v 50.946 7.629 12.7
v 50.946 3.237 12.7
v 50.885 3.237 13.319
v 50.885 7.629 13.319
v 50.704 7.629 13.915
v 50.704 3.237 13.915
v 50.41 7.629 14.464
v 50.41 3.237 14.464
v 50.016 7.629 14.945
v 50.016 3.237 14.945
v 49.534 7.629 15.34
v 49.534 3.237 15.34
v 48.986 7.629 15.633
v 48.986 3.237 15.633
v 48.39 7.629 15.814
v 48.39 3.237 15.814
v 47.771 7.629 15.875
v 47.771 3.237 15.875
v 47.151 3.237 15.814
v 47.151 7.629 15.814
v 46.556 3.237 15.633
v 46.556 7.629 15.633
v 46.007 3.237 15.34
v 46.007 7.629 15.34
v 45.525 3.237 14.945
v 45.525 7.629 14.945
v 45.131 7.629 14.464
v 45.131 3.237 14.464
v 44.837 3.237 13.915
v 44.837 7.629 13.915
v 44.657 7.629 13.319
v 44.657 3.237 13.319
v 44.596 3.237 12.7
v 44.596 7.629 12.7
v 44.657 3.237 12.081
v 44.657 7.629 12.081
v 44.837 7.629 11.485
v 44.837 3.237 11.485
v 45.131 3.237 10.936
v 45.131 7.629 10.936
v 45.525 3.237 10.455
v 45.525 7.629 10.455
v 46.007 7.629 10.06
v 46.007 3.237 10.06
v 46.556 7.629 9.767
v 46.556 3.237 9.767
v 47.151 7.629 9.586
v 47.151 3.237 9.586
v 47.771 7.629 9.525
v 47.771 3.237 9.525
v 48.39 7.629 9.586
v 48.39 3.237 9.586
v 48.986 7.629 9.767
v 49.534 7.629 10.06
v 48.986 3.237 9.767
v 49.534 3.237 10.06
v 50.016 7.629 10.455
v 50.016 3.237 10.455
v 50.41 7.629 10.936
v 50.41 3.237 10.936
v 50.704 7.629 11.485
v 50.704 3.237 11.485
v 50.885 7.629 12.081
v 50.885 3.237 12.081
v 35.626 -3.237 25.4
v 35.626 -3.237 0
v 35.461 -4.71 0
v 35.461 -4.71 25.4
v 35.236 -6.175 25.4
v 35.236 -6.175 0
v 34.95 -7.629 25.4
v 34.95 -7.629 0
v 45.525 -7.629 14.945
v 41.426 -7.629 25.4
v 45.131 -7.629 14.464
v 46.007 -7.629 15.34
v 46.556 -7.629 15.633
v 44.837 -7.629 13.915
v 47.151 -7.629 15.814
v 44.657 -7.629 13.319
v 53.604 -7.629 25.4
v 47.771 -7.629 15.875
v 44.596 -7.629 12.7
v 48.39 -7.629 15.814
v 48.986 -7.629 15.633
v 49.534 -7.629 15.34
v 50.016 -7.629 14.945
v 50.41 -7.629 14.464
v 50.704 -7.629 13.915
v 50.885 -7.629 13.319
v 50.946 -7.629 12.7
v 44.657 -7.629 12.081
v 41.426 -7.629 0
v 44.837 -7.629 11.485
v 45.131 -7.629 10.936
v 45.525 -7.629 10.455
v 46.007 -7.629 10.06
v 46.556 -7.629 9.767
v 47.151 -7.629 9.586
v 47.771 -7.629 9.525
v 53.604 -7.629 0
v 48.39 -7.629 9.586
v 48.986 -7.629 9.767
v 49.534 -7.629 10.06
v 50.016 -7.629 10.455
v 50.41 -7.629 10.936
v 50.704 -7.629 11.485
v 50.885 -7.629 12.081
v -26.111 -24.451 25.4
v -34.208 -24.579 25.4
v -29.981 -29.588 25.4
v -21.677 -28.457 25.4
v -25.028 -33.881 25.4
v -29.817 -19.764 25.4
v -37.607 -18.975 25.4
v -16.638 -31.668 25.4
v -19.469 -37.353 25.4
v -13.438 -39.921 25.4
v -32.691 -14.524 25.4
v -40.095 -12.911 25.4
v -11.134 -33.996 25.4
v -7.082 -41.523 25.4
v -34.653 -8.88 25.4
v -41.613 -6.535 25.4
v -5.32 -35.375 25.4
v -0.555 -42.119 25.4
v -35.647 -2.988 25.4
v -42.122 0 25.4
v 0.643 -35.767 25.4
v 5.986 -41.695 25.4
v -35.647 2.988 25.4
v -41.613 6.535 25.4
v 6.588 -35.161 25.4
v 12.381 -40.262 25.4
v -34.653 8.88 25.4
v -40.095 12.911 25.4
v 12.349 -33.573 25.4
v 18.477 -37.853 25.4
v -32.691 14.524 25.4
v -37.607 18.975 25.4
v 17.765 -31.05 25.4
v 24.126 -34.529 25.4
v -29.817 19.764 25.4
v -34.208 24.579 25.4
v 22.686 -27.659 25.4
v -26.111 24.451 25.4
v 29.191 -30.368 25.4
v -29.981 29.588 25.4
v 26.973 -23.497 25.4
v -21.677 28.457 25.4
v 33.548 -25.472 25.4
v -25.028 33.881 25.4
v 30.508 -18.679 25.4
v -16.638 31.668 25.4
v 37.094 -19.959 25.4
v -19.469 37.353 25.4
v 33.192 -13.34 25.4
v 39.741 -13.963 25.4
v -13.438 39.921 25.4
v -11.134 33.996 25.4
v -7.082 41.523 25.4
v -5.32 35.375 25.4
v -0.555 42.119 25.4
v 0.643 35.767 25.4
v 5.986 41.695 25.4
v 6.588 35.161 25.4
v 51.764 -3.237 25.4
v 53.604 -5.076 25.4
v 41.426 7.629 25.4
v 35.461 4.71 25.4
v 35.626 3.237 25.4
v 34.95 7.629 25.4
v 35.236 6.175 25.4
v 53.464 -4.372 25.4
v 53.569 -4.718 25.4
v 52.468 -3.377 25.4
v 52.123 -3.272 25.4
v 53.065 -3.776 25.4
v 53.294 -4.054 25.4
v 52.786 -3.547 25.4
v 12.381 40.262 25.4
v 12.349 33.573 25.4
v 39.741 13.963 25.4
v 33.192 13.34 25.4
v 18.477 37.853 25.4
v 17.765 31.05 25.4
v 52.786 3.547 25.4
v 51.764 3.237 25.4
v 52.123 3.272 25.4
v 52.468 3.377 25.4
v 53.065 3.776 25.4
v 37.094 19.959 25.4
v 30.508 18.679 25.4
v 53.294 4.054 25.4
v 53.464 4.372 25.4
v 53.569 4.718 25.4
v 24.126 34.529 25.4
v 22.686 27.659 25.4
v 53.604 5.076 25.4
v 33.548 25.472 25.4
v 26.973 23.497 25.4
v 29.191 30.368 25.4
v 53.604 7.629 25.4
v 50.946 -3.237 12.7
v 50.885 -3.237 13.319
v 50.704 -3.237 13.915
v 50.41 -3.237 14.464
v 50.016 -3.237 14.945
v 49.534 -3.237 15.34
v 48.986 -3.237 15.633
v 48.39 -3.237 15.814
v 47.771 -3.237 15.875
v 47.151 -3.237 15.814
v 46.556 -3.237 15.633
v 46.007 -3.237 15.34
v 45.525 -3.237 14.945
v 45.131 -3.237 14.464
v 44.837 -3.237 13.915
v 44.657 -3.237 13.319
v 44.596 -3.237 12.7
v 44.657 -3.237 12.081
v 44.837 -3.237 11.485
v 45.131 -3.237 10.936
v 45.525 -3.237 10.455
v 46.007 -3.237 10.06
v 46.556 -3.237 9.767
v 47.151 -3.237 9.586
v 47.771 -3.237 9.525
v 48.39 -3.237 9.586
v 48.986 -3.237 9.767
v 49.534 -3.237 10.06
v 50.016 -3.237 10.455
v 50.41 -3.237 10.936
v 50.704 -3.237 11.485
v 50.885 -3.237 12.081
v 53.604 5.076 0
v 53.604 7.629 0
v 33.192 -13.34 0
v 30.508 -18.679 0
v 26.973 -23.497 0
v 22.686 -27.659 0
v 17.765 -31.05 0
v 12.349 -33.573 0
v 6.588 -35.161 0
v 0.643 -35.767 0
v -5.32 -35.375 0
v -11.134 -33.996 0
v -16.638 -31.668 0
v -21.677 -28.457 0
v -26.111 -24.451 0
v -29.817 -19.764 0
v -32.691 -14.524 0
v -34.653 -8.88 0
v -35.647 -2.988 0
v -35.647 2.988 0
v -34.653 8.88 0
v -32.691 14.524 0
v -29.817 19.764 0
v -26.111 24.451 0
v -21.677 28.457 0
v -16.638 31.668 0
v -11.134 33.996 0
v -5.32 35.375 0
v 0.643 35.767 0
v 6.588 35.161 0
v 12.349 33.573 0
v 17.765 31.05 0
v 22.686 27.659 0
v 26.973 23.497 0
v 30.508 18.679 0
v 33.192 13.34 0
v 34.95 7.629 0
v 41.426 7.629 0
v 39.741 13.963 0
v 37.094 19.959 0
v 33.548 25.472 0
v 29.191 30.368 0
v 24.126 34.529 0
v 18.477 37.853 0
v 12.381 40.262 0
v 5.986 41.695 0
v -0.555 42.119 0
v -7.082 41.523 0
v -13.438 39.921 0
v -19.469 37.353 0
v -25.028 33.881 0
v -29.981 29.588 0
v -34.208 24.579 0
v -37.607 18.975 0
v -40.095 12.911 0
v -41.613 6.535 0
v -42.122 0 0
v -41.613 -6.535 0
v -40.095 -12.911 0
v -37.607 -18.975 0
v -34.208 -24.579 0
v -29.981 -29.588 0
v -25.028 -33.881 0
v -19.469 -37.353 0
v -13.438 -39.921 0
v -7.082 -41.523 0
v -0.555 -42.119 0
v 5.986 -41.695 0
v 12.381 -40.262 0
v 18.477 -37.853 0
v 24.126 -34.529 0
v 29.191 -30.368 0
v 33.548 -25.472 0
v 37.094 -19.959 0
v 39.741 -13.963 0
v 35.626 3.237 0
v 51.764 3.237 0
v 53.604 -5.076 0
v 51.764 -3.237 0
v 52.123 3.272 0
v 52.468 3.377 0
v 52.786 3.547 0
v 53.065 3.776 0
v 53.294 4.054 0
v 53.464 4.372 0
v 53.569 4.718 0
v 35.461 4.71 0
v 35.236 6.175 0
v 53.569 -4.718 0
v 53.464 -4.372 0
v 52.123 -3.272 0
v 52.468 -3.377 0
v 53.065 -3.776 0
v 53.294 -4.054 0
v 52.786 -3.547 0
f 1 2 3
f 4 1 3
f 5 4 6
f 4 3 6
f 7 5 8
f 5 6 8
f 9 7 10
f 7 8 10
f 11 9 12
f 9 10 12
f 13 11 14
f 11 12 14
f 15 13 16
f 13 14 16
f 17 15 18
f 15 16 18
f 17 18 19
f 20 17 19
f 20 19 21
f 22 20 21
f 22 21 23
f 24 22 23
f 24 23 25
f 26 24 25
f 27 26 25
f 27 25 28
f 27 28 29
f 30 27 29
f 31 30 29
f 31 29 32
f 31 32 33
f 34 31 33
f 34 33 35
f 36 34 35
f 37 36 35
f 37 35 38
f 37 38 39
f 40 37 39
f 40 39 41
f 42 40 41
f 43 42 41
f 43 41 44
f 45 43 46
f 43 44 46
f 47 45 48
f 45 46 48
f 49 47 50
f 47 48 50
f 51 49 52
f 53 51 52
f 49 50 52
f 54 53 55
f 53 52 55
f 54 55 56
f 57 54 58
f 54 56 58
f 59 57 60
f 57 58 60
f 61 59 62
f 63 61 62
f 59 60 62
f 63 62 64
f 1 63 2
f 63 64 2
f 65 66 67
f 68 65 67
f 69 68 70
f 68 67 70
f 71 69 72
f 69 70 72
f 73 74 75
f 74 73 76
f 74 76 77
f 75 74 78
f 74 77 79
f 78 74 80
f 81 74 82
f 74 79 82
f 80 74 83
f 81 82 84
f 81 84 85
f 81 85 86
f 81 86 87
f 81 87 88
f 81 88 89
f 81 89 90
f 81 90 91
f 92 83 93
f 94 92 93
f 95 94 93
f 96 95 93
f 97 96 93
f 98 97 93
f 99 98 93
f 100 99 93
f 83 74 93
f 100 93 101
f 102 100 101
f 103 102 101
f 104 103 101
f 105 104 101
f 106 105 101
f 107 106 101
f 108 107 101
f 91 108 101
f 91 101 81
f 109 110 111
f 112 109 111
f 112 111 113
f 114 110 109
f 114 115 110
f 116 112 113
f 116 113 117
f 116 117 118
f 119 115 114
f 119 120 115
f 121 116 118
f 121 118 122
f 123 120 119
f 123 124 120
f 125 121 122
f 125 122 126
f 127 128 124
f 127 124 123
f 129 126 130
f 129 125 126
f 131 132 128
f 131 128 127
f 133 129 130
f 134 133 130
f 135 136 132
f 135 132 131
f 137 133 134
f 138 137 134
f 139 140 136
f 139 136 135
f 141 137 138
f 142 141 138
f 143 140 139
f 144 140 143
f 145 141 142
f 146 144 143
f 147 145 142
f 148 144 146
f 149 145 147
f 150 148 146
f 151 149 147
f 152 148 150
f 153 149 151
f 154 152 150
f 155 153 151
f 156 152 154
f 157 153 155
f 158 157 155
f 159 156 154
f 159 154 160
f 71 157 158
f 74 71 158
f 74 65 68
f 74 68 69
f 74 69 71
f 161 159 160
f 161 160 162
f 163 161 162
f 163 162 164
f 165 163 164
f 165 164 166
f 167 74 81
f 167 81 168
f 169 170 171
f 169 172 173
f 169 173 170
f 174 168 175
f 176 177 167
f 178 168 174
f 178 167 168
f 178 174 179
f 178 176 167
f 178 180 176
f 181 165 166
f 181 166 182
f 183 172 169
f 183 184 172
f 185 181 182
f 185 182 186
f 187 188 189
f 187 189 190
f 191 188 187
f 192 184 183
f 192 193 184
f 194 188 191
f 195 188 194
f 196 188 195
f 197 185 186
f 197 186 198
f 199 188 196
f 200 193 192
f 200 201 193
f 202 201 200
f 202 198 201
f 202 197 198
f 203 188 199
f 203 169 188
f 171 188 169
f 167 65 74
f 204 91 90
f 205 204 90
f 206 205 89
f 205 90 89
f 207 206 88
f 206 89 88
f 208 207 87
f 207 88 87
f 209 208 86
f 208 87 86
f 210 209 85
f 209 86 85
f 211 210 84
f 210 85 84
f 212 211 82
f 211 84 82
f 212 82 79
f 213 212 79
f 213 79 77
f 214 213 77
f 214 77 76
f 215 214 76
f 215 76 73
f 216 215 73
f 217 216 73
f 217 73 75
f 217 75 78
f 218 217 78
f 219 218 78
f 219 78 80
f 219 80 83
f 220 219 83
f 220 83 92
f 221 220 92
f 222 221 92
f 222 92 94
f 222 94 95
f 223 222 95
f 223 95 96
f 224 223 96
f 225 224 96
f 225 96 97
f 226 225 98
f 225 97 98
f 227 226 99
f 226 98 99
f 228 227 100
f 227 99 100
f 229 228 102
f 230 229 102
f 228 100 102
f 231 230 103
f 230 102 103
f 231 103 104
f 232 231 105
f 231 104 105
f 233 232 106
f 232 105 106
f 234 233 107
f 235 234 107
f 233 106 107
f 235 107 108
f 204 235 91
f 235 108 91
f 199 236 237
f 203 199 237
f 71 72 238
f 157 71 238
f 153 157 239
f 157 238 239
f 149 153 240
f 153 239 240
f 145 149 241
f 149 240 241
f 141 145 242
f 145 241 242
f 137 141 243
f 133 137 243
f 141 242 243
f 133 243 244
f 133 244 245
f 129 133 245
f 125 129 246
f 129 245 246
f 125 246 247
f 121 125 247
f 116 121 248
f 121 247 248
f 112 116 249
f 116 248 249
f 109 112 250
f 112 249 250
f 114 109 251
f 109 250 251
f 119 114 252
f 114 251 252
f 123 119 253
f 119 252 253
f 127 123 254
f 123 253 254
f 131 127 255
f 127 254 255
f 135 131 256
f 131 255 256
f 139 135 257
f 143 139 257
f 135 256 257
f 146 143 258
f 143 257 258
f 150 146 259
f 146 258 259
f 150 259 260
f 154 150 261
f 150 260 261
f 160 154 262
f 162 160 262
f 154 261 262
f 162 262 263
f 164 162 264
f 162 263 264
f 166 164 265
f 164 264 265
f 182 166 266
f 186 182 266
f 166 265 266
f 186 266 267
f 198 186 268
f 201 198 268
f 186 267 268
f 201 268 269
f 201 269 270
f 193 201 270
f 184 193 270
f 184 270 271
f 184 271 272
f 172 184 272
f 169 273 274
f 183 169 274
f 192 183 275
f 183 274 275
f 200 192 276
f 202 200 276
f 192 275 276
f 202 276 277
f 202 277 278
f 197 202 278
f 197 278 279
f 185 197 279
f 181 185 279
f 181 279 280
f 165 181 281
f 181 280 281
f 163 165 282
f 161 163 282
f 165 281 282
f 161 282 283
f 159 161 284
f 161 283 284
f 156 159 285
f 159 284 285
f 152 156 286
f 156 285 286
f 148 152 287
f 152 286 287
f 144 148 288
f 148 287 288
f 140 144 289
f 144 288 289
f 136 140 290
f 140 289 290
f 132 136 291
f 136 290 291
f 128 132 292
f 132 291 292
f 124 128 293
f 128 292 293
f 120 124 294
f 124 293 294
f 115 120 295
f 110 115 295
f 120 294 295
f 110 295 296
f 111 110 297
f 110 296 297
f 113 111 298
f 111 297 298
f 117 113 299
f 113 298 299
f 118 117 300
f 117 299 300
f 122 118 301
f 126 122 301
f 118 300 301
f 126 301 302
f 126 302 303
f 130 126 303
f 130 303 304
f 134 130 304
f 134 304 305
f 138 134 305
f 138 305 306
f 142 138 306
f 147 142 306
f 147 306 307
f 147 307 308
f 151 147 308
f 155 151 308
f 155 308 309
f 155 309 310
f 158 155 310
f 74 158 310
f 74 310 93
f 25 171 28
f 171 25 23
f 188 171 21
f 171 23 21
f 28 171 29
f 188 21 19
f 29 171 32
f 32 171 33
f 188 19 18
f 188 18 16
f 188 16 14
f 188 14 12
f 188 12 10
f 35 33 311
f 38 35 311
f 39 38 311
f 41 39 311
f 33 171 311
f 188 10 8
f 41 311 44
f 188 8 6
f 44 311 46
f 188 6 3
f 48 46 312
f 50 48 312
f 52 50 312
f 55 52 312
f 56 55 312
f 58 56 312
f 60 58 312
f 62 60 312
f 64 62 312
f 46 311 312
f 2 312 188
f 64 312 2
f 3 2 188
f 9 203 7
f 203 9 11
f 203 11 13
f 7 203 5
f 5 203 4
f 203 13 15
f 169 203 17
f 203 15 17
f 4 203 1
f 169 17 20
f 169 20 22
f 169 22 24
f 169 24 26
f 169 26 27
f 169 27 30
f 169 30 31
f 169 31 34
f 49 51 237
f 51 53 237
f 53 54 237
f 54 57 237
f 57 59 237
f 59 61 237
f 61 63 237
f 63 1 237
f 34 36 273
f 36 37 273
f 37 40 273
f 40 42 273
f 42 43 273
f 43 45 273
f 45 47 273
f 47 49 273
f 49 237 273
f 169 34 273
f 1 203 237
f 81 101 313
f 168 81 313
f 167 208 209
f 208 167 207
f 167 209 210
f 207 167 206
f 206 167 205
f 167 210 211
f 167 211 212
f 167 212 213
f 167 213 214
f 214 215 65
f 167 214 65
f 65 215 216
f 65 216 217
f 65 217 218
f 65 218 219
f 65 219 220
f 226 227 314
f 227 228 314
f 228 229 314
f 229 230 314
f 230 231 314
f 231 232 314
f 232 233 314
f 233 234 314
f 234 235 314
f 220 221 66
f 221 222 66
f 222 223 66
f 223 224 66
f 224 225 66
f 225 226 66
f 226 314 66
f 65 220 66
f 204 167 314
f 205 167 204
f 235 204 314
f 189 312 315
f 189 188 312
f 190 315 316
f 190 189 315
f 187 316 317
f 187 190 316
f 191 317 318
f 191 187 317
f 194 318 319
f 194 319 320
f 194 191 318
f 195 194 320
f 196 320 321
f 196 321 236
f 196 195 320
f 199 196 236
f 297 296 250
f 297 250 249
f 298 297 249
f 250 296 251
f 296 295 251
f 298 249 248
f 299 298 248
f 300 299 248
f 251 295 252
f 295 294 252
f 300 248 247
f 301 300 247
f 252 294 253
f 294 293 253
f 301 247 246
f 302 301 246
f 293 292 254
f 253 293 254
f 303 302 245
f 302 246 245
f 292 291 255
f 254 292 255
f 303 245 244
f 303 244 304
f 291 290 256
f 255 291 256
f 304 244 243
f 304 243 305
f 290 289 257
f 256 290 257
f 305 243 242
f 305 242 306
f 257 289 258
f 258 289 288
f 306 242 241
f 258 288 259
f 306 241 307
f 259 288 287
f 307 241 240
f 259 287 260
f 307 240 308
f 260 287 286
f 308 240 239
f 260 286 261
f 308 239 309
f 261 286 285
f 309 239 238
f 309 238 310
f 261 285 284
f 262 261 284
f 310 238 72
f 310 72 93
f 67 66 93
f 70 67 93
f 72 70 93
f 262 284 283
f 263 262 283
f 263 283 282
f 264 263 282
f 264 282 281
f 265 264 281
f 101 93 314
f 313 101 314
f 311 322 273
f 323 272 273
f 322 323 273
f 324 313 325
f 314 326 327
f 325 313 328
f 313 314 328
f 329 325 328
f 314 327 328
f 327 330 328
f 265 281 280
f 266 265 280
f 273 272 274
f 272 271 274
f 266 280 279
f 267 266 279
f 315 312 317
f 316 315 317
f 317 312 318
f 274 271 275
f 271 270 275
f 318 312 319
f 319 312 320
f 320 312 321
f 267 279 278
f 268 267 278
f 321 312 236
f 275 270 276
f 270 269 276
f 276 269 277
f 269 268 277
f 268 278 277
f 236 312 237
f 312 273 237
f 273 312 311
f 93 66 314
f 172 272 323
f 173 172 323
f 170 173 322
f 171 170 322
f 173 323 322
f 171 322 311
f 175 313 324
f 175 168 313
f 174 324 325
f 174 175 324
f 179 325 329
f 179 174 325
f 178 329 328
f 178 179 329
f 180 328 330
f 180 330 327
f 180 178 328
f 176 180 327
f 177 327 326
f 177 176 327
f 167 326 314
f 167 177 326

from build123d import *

# Parameters (mm, degrees)
F1_DEPTH = 25.4
F3_D     = 6.35
F4_R     = 1.839631


with BuildPart() as f1:
    # F0 (on Top) → F1 (new body)
    with BuildSketch(Plane.XY):
        with BuildLine():
            ThreePointArc((34.949522, 7.62886), (35.355888, 5.443324), (35.62572, 3.236768))
            Line((35.62572, 3.236768), (41.997912, 3.236768))
            ThreePointArc((41.997912, 3.236768), (41.769655, 5.440338), (41.425859, 7.62886))
            Line((41.425859, 7.62886), (34.949522, 7.62886))
        make_face()
        with BuildLine():
            ThreePointArc((34.949522, -7.62886), (-35.772456, 0), (34.949522, 7.62886))
            Line((34.949522, 7.62886), (41.425859, 7.62886))
            ThreePointArc((41.425859, 7.62886), (-42.122456, 0), (41.425859, -7.62886))
            Line((41.425859, -7.62886), (34.949522, -7.62886))
        make_face()
        with BuildLine():
            ThreePointArc((41.425859, 7.62886), (41.769655, 5.440338), (41.997912, 3.236768))
            Line((41.997912, 3.236768), (53.603914, 3.236768))
            Line((53.603914, 3.236768), (53.603914, 7.62886))
            Line((53.603914, 7.62886), (41.425859, 7.62886))
        make_face()
        with BuildLine():
            ThreePointArc((35.62572, -3.236768), (35.355888, -5.443324), (34.949522, -7.62886))
            Line((34.949522, -7.62886), (41.425859, -7.62886))
            ThreePointArc((41.425859, -7.62886), (41.769655, -5.440338), (41.997912, -3.236768))
            Line((41.997912, -3.236768), (35.62572, -3.236768))
        make_face()
        with BuildLine():
            ThreePointArc((41.997912, -3.236768), (41.769655, -5.440338), (41.425859, -7.62886))
            Line((41.425859, -7.62886), (53.603914, -7.62886))
            Line((53.603914, -7.62886), (53.603914, -3.236768))
            Line((53.603914, -3.236768), (41.997912, -3.236768))
        make_face()
    extrude(amount=F1_DEPTH)

    # F3 (through all)
    with Locations(Plane(origin=(0, 7.62886, 0), x_dir=(-1, 0, 0), z_dir=(0, 1, 0))):
        with Locations((-47.770534, 12.7)):
            Hole(F3_D / 2)

    # F4
    f4_edges = [f1.edges().sort_by_distance(p)[0] for p in [
        (53.603914, 3.236768, 12.7),
        (53.603914, -3.236768, 12.7),
    ]]
    fillet(f4_edges, radius=F4_R)


solid = f1.part
